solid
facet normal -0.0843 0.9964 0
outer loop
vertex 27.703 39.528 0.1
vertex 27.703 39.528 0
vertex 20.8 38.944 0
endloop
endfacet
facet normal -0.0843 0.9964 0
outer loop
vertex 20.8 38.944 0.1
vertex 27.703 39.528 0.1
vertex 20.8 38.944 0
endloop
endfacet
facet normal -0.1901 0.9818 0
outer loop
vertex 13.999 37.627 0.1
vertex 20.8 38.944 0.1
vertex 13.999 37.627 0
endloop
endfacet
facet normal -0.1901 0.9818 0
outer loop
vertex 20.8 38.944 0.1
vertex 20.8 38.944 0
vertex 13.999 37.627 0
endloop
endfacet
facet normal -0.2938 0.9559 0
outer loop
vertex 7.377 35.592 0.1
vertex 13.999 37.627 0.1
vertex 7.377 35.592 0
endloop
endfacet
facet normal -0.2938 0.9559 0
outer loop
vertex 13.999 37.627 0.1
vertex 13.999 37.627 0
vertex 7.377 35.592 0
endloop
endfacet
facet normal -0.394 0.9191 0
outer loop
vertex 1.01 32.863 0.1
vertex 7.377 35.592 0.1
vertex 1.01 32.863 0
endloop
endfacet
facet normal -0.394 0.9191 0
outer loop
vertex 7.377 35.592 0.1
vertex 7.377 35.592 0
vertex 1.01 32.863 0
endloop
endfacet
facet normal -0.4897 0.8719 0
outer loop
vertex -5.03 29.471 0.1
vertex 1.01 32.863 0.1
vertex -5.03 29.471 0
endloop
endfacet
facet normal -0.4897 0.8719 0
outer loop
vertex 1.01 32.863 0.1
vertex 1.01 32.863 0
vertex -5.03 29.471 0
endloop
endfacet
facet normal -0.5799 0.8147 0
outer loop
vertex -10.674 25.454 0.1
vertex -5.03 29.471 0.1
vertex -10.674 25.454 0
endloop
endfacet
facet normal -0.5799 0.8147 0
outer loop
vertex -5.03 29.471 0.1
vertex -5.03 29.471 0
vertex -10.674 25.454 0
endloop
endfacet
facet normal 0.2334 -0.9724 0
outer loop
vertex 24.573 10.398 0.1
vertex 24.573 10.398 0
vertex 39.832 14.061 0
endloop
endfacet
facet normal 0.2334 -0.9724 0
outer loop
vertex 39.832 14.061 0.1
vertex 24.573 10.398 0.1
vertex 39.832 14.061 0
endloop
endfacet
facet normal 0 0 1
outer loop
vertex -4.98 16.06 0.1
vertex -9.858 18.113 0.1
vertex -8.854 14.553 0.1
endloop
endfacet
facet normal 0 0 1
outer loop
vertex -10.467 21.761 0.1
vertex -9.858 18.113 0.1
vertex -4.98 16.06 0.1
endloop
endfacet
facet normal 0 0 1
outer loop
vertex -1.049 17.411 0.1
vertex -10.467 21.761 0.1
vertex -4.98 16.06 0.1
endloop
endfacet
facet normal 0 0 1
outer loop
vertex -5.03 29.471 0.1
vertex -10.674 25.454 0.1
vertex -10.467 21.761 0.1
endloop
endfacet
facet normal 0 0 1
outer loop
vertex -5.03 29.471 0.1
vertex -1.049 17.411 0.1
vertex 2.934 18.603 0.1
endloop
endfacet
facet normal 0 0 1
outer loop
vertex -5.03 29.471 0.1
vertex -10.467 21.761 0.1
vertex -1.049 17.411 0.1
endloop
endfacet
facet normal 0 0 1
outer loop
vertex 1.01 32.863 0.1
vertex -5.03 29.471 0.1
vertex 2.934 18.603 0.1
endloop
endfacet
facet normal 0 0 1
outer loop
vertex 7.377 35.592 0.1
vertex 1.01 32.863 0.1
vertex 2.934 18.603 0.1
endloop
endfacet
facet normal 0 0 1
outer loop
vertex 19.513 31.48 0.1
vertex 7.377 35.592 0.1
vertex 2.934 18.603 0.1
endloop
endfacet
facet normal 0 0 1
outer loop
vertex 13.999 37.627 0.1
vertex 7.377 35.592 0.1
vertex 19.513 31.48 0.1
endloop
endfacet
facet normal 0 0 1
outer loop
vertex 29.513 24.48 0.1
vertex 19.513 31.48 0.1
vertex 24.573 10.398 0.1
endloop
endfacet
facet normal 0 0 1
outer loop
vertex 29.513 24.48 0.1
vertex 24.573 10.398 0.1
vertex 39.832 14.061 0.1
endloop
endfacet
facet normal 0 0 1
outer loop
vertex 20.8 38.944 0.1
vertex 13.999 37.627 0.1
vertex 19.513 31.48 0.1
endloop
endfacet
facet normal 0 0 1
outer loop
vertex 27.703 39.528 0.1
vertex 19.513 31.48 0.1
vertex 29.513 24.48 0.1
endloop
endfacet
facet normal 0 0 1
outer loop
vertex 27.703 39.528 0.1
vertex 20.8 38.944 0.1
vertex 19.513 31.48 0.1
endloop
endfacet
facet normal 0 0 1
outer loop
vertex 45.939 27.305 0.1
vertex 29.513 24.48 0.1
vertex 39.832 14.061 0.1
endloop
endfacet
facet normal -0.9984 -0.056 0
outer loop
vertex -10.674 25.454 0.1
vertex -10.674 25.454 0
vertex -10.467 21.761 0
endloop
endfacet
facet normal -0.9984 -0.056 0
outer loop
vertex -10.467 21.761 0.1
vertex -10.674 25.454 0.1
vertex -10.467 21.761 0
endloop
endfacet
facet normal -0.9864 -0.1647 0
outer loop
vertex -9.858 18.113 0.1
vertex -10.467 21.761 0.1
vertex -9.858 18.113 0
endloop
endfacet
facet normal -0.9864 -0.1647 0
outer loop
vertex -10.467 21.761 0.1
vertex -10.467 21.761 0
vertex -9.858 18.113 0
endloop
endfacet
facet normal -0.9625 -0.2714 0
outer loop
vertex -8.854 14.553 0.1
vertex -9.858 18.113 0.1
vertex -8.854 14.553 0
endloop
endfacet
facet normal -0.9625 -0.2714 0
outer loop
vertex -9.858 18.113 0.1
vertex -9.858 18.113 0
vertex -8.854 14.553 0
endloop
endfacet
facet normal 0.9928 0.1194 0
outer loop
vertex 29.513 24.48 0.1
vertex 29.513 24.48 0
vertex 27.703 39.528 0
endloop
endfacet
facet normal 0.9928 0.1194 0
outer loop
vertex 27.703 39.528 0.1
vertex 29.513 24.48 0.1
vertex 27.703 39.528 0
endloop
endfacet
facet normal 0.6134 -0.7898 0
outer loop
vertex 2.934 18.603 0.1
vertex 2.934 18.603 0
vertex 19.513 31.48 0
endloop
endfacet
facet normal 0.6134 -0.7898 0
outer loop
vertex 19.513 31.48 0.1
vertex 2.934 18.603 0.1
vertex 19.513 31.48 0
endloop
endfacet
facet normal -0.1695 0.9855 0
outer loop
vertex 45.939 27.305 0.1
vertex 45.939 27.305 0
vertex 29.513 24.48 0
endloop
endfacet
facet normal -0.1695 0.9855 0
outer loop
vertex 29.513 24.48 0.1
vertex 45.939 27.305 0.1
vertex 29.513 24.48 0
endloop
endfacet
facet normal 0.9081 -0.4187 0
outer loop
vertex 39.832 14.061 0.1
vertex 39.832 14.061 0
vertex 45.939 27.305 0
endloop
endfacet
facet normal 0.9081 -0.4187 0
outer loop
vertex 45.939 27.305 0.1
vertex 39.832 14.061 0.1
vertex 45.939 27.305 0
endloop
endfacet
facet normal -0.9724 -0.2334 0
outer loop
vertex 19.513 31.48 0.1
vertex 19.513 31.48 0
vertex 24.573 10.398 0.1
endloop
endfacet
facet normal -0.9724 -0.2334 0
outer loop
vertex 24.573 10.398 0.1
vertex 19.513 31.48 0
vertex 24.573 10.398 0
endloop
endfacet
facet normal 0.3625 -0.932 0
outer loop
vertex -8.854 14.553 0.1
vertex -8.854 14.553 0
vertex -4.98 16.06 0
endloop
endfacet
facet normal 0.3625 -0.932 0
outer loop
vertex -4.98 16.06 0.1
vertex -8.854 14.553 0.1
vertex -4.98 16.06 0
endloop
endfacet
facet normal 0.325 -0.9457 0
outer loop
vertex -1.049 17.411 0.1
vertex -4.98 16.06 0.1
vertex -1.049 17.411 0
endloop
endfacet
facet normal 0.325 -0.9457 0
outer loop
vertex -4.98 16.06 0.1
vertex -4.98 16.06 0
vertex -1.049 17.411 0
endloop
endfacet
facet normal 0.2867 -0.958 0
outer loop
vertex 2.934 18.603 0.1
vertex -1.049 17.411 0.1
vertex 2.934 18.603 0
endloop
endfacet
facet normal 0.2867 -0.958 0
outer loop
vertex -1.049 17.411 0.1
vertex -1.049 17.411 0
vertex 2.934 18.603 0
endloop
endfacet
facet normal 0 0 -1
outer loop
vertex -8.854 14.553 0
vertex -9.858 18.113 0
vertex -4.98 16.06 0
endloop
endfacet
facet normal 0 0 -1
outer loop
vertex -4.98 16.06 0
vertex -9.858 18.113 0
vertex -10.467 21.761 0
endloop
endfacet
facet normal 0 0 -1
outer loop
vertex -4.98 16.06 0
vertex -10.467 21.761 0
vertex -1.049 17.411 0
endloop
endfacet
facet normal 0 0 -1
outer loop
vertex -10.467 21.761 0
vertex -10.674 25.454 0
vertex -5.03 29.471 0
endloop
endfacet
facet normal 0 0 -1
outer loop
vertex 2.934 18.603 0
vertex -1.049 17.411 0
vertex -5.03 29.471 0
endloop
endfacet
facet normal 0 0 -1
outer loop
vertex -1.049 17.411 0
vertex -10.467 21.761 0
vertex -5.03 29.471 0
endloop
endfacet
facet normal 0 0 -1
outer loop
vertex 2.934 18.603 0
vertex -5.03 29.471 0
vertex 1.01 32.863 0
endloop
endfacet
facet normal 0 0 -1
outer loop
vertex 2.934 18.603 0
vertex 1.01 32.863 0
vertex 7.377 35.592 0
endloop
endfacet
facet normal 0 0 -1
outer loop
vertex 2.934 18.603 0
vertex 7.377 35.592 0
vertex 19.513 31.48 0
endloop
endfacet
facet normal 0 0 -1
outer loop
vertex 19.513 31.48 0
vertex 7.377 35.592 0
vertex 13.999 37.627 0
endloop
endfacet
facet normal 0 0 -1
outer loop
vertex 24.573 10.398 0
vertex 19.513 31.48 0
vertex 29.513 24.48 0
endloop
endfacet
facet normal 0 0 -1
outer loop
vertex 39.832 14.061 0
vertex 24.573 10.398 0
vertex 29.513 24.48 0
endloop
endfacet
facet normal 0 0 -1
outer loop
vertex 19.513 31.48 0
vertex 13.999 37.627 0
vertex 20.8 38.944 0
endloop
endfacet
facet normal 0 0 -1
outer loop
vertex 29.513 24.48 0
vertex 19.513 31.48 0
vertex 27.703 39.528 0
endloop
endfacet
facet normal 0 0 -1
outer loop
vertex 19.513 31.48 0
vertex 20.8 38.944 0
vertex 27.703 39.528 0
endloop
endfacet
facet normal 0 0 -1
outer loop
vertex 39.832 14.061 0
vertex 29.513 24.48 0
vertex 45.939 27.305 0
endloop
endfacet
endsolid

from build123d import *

# Parameters (mm, degrees)
SALIENTE_EXTRUIR1_DEPTH = 0.1


with BuildPart() as part:
    # Model → Saliente-Extruir1 (new body)
    with BuildSketch(Plane.XY):
        with BuildLine():
            Line((29.512585392, 24.480394017), (27.703067566, 39.527605983))
            ThreePointArc((27.703067566, 39.527605983), (7.377127931, 35.592311556), (-10.673926914, 25.453781916))
            ThreePointArc((-10.673926914, 25.453781916), (-10.212179423, 19.928358371), (-8.854222662, 14.552535688))
            ThreePointArc((-8.854222662, 14.552535688), (-3.021164415, 16.754836825), (2.933605753, 18.6029199))
            Line((2.933605753, 18.6029199), (19.512585392, 31.480394017))
            Line((19.512585392, 31.480394017), (24.573492595, 10.397787824))
            Line((24.573492595, 10.397787824), (39.831918887, 14.06059302))
            Line((39.831918887, 14.06059302), (45.938881991, 27.30453113))
            Line((45.938881991, 27.30453113), (29.512585392, 24.480394017))
        make_face()
    extrude(amount=SALIENTE_EXTRUIR1_DEPTH)


solid = part.part
